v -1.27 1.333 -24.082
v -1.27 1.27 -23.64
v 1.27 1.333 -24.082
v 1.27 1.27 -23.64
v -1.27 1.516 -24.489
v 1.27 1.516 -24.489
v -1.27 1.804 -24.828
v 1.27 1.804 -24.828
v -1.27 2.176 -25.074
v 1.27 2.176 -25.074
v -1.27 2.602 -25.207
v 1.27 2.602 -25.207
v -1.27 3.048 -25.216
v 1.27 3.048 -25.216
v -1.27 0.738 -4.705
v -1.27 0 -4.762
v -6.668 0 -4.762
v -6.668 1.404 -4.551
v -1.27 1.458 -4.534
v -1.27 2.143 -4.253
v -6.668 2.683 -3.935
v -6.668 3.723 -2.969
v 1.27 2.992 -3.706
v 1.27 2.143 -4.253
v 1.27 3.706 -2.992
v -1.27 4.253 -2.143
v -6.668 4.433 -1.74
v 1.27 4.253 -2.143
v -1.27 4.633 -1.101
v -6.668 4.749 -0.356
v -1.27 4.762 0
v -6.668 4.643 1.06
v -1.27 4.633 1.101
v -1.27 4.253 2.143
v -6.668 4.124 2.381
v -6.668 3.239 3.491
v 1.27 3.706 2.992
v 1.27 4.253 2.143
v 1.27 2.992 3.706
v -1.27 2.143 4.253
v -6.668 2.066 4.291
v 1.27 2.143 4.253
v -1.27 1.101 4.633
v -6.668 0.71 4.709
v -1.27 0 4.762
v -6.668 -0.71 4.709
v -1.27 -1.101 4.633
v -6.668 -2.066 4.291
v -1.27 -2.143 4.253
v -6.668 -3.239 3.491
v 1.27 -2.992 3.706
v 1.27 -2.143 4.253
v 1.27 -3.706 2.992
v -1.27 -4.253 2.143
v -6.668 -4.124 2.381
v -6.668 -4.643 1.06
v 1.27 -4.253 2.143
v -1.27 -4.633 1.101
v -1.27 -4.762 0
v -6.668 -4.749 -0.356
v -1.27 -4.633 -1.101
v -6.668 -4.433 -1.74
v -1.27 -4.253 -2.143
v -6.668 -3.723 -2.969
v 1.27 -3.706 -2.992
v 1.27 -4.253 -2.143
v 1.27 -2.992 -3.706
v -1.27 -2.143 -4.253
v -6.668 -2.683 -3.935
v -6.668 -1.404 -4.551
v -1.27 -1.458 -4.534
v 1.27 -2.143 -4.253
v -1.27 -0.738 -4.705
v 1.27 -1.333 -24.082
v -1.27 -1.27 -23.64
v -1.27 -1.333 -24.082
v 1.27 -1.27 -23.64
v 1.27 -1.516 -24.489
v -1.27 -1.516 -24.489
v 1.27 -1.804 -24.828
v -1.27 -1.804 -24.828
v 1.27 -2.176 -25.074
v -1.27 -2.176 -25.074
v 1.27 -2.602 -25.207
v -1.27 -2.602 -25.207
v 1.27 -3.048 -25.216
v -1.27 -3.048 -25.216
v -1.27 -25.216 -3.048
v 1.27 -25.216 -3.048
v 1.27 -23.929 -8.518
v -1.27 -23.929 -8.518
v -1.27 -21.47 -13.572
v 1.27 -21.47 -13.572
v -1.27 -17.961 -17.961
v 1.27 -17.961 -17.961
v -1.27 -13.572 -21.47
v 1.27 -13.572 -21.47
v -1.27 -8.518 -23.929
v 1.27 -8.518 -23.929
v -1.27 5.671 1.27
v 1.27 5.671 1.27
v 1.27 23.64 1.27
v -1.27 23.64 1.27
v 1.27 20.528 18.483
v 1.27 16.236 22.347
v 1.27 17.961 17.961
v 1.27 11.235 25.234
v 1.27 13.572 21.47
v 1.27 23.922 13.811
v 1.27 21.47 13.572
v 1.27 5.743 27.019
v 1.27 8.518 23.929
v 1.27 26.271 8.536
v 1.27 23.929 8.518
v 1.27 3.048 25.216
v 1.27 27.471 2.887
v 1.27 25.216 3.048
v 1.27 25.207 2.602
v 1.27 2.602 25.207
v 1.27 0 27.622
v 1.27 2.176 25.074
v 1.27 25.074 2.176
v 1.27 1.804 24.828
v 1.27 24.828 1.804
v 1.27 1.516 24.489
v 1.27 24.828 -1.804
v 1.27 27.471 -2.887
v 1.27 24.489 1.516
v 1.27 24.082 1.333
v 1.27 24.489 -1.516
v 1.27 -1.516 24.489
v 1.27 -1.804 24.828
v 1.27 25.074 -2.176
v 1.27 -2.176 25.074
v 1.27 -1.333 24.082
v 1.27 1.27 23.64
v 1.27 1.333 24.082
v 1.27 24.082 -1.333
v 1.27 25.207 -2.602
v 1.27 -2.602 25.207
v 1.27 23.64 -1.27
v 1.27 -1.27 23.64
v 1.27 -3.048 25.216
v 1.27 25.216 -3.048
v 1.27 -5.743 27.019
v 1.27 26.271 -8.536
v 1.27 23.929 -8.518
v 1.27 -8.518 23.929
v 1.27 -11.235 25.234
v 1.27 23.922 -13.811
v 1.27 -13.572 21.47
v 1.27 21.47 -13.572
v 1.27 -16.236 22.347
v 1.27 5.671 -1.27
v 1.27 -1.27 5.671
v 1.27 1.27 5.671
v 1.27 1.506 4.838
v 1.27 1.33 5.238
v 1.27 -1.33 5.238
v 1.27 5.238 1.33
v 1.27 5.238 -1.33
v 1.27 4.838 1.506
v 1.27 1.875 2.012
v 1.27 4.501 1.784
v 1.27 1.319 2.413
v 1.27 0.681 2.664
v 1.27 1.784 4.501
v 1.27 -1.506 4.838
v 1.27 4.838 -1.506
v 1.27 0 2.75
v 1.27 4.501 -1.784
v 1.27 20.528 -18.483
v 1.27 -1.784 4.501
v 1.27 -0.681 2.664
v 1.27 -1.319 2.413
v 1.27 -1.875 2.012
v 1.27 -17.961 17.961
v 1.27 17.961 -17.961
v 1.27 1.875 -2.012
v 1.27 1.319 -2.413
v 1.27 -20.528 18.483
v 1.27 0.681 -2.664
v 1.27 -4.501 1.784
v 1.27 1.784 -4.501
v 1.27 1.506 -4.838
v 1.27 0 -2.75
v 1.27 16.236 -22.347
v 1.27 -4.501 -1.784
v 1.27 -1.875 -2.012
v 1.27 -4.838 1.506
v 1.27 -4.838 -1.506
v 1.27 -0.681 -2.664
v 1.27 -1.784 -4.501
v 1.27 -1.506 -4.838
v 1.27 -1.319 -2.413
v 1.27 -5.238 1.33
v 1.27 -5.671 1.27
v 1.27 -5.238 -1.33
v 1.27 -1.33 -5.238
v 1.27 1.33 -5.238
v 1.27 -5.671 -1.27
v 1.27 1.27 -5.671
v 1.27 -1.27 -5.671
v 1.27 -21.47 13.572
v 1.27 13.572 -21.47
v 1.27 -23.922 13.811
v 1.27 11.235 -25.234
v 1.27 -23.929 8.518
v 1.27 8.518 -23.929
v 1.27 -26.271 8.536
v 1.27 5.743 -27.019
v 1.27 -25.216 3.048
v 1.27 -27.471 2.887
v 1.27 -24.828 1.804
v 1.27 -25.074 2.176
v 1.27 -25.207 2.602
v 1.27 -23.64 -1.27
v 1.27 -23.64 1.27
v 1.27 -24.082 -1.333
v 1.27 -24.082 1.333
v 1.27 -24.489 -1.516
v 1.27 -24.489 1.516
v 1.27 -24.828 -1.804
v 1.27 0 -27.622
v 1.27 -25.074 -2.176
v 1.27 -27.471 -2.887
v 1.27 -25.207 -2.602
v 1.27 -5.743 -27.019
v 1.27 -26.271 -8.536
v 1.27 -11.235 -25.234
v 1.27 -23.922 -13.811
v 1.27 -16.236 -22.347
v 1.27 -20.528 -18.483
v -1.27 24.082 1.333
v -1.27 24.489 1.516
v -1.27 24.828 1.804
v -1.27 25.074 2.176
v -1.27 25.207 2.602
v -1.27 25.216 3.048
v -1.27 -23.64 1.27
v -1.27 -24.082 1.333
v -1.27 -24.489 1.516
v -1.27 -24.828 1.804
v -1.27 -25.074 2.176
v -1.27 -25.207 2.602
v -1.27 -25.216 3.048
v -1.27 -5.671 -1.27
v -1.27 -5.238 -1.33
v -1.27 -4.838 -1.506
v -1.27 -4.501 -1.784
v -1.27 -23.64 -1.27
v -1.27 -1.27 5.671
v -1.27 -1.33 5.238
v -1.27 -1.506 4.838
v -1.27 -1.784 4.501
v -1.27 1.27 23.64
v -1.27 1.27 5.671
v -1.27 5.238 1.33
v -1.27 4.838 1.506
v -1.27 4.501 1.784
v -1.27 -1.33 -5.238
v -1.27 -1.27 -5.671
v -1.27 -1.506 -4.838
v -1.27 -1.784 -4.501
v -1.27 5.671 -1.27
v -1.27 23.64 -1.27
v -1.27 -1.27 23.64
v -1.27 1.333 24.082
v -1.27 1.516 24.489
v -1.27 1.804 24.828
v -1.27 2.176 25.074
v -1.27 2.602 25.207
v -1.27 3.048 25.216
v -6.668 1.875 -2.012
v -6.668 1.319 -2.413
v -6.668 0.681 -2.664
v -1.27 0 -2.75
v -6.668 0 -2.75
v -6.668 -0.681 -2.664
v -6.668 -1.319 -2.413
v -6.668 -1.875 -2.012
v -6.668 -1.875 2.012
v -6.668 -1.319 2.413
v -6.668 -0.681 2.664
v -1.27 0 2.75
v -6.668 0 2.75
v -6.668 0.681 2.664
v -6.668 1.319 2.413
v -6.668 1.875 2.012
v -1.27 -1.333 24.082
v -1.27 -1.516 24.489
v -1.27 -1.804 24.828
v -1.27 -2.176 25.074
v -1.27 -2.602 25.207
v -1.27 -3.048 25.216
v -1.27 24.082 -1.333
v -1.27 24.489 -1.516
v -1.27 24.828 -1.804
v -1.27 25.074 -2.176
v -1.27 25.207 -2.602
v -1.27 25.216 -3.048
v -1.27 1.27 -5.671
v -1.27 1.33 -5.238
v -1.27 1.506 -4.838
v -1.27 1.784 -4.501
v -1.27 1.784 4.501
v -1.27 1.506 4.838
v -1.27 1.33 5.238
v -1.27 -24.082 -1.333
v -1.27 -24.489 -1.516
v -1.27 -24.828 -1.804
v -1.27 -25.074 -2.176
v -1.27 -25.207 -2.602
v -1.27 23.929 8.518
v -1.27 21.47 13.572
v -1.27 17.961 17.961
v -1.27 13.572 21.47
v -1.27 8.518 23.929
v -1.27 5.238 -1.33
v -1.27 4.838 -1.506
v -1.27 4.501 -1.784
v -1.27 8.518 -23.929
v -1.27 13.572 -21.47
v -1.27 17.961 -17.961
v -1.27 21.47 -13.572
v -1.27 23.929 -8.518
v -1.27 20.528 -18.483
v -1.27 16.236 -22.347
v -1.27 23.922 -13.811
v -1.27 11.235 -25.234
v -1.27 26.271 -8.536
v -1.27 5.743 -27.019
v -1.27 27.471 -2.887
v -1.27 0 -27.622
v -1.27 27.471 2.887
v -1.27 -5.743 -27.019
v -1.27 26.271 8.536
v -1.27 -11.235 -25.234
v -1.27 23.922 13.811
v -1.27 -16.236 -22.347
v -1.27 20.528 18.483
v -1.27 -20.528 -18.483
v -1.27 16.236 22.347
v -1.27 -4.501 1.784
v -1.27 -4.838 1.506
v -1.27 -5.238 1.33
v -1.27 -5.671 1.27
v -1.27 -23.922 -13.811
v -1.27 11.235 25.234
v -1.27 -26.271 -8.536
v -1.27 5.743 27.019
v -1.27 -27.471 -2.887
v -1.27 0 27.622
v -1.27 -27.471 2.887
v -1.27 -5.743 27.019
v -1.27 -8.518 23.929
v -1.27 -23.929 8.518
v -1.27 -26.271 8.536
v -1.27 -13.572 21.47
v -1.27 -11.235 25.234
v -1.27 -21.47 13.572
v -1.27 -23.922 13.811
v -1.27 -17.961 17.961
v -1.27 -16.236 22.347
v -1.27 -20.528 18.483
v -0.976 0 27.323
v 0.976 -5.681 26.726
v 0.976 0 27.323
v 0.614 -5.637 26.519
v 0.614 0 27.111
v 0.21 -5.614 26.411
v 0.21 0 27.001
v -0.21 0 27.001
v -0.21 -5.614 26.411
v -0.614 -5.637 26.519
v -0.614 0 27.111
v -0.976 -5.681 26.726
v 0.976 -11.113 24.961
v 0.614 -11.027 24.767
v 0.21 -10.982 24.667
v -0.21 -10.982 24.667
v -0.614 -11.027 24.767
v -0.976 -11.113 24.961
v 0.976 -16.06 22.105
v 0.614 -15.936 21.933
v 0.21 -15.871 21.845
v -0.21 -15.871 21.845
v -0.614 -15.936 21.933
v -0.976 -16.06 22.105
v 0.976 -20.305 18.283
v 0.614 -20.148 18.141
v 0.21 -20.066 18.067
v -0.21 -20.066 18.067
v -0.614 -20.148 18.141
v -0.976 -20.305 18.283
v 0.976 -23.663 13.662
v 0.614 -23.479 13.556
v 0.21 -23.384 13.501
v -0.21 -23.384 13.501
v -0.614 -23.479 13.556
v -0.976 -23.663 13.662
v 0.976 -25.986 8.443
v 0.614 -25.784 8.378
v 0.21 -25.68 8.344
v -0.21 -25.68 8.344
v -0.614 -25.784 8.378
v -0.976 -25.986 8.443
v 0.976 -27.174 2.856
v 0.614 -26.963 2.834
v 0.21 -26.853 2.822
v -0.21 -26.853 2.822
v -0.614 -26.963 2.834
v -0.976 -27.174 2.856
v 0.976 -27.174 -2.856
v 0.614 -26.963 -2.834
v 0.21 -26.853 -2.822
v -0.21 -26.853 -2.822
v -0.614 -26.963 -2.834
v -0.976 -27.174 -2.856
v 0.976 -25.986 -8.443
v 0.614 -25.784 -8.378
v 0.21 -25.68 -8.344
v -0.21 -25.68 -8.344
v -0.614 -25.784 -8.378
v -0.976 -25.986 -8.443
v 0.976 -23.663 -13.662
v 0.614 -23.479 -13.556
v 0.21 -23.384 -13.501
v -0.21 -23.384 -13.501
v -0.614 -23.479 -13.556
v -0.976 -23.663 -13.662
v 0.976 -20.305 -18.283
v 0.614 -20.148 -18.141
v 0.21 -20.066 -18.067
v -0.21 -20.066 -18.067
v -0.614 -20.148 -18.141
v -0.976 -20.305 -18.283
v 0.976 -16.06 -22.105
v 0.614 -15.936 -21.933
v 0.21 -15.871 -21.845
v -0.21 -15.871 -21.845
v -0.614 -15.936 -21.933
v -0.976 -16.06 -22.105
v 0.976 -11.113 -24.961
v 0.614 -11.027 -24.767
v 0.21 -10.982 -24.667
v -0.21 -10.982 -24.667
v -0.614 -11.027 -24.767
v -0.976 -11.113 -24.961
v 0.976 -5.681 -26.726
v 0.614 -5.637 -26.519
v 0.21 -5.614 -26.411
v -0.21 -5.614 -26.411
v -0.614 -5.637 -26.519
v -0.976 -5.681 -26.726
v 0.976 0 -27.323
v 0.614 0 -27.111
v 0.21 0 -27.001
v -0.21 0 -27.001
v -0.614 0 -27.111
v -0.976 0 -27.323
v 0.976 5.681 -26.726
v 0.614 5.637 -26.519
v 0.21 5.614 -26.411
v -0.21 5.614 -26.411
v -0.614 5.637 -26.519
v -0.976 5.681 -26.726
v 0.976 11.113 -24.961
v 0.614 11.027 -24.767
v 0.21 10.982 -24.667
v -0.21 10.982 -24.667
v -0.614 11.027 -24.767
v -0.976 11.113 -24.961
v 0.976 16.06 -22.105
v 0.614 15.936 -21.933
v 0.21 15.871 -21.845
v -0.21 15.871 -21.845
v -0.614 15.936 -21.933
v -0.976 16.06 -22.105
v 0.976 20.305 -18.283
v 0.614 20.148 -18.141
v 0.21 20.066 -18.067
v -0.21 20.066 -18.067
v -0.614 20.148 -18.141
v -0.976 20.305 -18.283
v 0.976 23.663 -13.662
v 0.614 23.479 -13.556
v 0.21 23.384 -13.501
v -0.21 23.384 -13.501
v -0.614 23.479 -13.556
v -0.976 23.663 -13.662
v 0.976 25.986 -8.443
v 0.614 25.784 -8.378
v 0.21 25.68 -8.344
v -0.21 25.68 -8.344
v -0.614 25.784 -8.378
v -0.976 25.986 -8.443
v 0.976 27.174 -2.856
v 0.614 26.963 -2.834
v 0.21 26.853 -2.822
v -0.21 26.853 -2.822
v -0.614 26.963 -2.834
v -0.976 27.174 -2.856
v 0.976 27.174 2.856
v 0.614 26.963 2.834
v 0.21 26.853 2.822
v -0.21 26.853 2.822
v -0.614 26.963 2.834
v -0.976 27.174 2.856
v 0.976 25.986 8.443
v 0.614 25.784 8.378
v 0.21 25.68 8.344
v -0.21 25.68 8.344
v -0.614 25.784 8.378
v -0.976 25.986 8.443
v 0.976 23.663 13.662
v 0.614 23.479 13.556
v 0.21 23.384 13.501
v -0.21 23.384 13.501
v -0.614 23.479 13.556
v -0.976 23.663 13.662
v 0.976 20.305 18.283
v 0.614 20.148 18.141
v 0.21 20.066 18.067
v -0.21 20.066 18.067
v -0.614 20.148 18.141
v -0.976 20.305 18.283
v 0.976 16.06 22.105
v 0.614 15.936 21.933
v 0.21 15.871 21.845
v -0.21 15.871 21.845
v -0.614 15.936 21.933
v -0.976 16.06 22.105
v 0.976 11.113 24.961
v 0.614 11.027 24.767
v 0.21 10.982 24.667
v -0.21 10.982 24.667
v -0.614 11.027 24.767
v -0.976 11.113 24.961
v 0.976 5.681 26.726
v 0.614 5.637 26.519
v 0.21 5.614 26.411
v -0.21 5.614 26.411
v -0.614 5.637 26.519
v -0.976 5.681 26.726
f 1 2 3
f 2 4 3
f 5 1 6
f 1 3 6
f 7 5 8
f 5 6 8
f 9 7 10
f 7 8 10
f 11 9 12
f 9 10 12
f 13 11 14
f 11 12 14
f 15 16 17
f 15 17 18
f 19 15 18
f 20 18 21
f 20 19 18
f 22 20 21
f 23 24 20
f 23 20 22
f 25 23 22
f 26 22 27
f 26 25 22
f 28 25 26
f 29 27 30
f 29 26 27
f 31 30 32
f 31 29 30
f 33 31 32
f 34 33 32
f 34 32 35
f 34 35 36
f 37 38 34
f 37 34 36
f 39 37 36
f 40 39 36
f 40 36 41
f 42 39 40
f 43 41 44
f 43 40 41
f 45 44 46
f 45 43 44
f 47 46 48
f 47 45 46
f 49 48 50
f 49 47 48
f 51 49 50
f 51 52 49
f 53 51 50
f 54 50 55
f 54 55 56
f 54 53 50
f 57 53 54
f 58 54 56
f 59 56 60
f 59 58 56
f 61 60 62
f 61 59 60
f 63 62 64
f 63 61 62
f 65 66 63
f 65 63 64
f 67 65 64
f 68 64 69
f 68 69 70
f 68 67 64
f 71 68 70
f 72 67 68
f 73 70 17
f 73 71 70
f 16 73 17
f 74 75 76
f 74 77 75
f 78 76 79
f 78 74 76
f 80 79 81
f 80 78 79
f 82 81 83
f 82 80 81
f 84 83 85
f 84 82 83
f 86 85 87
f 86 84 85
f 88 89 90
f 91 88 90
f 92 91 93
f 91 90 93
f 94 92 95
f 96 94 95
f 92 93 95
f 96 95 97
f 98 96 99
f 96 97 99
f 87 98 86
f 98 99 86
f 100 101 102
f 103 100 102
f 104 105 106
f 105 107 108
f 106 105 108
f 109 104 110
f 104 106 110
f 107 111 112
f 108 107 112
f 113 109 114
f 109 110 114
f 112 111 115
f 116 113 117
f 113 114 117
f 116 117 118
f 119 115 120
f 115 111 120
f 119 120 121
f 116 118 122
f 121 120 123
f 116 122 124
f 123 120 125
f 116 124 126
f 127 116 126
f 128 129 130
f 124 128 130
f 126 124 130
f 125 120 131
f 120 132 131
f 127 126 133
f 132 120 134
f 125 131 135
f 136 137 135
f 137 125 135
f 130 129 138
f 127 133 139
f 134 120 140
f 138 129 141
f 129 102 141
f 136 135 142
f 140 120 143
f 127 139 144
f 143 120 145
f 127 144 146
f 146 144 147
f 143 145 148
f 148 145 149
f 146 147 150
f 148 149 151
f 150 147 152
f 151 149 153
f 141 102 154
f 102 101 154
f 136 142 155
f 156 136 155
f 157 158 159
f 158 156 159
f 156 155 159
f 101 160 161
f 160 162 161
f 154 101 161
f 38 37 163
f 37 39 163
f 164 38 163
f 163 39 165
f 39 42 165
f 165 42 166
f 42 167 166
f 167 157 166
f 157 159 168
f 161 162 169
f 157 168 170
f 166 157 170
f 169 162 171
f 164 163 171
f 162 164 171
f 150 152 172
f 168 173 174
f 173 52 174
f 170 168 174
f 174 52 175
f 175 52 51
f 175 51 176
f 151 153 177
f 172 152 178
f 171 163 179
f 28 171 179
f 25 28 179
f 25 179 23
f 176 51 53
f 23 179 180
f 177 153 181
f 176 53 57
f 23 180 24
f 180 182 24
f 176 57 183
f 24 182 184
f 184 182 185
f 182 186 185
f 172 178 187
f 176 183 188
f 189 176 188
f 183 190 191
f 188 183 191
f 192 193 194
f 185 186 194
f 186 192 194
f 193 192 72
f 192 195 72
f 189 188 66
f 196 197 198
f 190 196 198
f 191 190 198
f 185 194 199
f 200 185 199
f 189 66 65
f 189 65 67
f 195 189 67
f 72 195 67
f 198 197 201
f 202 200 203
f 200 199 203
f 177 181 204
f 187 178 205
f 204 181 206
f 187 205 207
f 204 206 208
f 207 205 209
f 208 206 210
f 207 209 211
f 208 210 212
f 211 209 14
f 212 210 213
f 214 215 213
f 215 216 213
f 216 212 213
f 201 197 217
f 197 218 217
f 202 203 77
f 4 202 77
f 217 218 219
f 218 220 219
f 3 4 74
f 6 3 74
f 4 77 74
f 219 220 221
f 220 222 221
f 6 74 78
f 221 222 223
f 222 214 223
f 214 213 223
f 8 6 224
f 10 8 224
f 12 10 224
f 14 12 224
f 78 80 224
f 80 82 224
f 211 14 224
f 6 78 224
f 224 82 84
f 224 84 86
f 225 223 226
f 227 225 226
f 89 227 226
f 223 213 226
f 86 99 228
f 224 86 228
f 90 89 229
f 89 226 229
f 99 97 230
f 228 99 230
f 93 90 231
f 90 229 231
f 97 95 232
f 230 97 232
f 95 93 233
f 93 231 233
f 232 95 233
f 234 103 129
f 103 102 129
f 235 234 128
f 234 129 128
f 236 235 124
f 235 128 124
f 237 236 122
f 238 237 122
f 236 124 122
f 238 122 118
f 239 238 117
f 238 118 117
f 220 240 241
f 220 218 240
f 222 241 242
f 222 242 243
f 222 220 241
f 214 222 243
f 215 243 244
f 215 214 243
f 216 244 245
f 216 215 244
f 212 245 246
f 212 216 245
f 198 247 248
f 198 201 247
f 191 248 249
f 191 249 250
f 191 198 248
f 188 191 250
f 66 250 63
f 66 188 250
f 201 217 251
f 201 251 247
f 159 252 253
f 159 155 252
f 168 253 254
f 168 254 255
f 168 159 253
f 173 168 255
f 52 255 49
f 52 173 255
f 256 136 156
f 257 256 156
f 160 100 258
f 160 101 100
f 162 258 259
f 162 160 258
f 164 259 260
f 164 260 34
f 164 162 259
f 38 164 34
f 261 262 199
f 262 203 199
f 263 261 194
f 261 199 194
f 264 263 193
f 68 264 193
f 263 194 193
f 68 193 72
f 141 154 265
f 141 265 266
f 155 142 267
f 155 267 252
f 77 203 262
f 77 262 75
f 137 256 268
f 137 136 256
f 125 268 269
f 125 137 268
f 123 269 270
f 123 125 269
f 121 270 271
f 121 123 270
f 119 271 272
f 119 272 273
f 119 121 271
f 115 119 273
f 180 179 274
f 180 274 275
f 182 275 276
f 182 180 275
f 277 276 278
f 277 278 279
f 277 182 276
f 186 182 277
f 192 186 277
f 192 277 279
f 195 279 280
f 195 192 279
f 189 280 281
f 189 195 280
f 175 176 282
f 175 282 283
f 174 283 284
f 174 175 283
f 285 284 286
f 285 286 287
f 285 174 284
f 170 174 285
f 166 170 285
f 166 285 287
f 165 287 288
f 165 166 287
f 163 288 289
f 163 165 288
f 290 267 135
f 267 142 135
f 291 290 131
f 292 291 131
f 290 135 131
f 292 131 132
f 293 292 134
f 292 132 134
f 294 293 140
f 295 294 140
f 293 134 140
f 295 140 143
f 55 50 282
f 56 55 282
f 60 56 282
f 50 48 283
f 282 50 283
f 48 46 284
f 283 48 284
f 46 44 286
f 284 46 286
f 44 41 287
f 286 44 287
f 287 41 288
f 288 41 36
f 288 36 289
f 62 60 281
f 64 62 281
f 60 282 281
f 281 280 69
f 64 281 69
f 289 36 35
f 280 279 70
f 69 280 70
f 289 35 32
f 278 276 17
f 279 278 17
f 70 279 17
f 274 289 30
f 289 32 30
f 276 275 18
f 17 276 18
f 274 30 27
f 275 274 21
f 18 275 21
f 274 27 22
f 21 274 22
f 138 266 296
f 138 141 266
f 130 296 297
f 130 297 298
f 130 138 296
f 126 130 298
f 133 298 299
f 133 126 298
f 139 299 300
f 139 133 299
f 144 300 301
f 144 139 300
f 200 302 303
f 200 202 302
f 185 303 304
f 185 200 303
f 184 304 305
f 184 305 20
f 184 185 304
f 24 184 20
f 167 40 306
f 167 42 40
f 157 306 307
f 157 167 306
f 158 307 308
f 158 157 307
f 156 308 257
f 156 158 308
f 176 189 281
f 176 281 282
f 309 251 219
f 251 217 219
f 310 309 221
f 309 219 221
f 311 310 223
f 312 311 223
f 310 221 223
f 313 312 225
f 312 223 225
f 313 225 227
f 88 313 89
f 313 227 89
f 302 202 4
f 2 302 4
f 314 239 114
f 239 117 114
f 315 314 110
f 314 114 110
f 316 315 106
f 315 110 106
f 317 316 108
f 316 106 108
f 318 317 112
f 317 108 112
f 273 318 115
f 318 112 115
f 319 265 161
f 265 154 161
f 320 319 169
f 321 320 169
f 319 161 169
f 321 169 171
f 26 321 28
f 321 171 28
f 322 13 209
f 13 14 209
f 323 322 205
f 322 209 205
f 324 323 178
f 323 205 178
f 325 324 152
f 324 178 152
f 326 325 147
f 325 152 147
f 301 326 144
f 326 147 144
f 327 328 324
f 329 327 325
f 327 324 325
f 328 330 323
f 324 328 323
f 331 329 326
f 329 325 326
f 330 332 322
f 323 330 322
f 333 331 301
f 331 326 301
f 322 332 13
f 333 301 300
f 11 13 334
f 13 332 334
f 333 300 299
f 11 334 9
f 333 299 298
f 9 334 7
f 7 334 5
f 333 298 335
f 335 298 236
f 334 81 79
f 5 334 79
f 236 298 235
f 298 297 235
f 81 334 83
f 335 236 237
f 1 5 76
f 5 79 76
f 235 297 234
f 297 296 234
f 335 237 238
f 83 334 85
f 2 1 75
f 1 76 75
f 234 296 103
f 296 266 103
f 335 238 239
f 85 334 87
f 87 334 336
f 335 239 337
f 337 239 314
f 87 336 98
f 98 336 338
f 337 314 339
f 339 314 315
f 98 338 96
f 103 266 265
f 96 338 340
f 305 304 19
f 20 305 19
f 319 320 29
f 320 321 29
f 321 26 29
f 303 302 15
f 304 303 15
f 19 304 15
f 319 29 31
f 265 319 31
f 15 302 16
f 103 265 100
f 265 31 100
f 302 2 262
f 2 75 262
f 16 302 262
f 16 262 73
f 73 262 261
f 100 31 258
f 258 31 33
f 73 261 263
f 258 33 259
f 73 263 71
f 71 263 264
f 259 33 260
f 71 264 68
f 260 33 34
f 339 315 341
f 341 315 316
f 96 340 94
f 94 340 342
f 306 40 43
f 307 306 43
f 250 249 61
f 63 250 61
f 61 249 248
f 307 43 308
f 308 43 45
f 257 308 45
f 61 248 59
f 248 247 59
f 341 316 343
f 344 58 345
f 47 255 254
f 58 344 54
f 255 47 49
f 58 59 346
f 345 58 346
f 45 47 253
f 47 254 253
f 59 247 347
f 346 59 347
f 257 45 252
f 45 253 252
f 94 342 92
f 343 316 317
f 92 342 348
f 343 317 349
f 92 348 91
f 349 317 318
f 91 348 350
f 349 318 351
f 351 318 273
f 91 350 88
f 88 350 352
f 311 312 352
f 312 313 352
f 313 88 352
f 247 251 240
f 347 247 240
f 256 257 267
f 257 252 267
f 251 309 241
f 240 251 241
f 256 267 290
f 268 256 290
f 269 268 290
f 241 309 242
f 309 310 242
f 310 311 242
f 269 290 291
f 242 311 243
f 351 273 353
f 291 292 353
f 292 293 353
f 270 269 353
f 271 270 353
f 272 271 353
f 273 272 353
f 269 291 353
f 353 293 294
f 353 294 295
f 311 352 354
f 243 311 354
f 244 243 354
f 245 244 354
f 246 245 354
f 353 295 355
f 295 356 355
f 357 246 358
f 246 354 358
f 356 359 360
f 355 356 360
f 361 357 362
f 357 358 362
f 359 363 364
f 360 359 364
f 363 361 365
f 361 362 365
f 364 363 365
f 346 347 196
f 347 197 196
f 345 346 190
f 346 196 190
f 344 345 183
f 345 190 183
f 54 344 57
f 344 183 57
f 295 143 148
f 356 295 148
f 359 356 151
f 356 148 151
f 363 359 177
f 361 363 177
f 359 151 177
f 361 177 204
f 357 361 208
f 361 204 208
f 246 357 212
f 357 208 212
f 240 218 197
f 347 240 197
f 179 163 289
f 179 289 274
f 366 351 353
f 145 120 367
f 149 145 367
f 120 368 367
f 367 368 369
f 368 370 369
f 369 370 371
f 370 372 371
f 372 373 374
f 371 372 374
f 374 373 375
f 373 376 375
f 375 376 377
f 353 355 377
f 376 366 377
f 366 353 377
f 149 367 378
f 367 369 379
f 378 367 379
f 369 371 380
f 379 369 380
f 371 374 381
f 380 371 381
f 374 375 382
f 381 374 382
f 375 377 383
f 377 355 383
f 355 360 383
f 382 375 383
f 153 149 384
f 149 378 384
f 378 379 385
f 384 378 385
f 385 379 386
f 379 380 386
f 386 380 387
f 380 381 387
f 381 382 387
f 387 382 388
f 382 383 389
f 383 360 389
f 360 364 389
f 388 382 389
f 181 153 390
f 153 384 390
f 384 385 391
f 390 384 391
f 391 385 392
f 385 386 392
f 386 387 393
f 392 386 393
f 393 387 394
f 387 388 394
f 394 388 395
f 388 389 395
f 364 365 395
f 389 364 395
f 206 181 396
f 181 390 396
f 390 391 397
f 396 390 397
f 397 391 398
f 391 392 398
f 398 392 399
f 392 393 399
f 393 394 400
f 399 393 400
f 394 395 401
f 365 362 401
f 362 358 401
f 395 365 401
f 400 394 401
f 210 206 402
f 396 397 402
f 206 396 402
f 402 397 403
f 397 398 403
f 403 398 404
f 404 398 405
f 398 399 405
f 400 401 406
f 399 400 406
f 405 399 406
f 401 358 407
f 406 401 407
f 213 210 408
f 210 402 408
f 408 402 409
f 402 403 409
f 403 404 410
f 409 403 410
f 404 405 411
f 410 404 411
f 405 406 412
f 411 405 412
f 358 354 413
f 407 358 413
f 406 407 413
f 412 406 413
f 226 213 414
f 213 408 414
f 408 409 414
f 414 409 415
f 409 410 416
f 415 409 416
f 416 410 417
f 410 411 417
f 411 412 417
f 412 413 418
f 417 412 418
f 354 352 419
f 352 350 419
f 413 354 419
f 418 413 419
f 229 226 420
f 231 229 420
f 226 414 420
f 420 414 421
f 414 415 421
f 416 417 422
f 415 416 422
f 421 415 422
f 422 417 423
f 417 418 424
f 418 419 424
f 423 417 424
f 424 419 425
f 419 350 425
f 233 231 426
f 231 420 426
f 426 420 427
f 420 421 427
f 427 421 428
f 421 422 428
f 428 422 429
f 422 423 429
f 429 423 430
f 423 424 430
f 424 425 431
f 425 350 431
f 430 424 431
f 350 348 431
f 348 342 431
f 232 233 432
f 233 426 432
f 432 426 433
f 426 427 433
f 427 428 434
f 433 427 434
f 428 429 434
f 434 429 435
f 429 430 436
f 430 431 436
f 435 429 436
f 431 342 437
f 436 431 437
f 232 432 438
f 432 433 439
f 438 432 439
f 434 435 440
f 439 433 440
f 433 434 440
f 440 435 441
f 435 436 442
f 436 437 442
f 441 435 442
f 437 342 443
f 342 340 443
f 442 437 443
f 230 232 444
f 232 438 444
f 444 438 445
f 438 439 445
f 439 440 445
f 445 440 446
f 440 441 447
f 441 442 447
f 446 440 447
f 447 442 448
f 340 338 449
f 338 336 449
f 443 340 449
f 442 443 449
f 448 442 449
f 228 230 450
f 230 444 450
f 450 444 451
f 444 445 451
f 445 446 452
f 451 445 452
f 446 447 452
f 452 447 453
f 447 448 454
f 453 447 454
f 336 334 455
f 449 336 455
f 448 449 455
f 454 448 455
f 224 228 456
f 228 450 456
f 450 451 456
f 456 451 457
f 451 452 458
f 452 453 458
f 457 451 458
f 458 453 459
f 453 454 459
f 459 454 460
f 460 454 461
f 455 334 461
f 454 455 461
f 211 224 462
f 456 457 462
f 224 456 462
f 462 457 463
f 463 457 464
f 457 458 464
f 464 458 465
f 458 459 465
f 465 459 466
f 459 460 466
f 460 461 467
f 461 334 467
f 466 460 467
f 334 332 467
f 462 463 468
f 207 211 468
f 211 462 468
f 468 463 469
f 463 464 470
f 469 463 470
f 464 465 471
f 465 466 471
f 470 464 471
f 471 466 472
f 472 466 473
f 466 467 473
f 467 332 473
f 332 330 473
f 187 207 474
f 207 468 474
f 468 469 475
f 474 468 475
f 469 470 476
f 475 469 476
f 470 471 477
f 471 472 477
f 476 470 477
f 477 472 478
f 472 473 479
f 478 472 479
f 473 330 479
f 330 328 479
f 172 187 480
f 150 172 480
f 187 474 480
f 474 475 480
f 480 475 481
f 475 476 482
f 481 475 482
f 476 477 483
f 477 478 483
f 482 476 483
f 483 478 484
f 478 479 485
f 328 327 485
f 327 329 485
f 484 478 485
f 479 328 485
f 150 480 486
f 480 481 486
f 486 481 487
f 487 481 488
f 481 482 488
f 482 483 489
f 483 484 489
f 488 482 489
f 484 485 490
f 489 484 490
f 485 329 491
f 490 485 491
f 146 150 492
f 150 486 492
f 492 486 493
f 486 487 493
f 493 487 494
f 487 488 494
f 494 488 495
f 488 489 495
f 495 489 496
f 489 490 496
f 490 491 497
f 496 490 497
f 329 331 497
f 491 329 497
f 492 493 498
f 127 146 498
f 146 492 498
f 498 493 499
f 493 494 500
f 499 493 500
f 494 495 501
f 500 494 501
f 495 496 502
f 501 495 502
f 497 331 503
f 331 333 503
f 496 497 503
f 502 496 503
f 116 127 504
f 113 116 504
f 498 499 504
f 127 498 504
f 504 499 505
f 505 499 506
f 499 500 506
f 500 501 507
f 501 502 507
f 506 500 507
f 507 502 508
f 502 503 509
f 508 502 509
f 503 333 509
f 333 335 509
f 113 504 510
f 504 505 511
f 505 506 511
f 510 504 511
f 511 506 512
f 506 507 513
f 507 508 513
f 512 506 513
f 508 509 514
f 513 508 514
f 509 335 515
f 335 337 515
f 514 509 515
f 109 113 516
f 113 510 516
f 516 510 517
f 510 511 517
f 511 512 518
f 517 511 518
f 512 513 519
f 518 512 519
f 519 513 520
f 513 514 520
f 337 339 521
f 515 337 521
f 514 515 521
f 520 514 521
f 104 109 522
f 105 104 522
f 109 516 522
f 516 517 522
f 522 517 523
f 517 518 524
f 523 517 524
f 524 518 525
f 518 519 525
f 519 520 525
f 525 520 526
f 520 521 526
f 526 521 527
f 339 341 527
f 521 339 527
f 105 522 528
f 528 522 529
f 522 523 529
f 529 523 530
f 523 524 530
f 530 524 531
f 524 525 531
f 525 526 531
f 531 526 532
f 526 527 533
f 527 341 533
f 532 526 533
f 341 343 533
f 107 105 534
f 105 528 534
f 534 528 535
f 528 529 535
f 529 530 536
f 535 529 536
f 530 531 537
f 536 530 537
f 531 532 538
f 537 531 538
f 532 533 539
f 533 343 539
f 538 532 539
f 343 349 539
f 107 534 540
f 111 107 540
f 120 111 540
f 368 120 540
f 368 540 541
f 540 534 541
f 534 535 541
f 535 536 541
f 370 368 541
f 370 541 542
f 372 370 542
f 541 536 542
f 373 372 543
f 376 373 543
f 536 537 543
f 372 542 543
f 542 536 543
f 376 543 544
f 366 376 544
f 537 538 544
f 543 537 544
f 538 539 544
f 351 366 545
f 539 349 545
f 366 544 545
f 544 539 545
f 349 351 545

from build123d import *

# Parameters (mm, degrees)
SKETCH2_R           = 4.7625
BOSS_EXTRUDE1_DEPTH = 7.9375
SKETCH3_W           = 22.65
SKETCH3_H           = 2.54
SKETCH3_W_2         = 2.54
SKETCH3_H_2         = 23.525
EXTRUDE_THIN1_DEPTH = 2.54
FILLET1_R           = 1.5875


with BuildPart() as part:
    # Sketch1 → Revolve1 (revolve)
    with BuildSketch(Plane.XY, mode=Mode.PRIVATE) as revolve1_sk:
        with BuildLine():
            Line((-1.27, 25.4), (1.27, 25.4))
            Line((1.27, 25.4), (1.27, 27.6225))
            ThreePointArc((1.27, 27.6225), (0, 26.9875), (-1.27, 27.6225))
            Line((-1.27, 27.6225), (-1.27, 25.4))
        make_face()
    revolve(revolve1_sk.sketch.rotate(Axis((-2.168850248, 0, 0), (1, 0, 0)), 90), axis=Axis((-2.168850248, 0, 0), (1, 0, 0)))



with BuildPart() as body_2:
    # Sketch2 → Boss-Extrude1 (new body)
    with BuildSketch(Plane(origin=(1.27, 0, 0), x_dir=(0, 0, -1), z_dir=(1, 0, 0))):
        Circle(SKETCH2_R)
        with BuildLine():
            Line((-2.011684617, 1.875), (2.011684617, 1.875))
            ThreePointArc((2.011684617, 1.875), (2.75, 0), (2.011684617, -1.875))
            Line((2.011684617, -1.875), (-2.011684617, -1.875))
            ThreePointArc((-2.011684617, -1.875), (-2.75, 0), (-2.011684617, 1.875))
        make_face(mode=Mode.SUBTRACT)
    extrude(amount=-BOSS_EXTRUDE1_DEPTH)


with BuildPart() as part_1:
    add(part.part)

    add(body_2.part)  # Extrude-Thin1 merges body 2
    # Sketch3 → Extrude-Thin1 (add)
    with BuildSketch(Plane(origin=(1.27, 0, 0), x_dir=(0, 0, -1), z_dir=(1, 0, 0))):
        with Locations((-14.075, 0)):
            Rectangle(SKETCH3_W, SKETCH3_H)
        with Locations((0, 13.6375)):
            Rectangle(SKETCH3_W_2, SKETCH3_H_2)
        with Locations((14.075, 0)):
            Rectangle(SKETCH3_W, SKETCH3_H)
        with Locations((0, -13.6375)):
            Rectangle(SKETCH3_W_2, SKETCH3_H_2)
    extrude(amount=-EXTRUDE_THIN1_DEPTH)

    # Fillet1
    fillet1_edges = [part_1.edges().sort_by_distance(p)[0] for p in [
        (0, -1.27, -4.590044254),
        (0, -1.27, -25.368230131),
        (0, 1.27, 25.368230131),
        (0, -1.27, 25.368230131),
        (0, -4.590044254, -1.27),
        (0, -25.368230131, -1.27),
        (0, -4.590044254, 1.27),
        (0, -25.368230131, 1.27),
        (0, 1.27, 4.590044254),
        (0, -1.27, 4.590044254),
        (0, 25.368230131, 1.27),
        (0, 4.590044254, 1.27),
        (0, 4.590044254, -1.27),
        (0, 25.368230131, -1.27),
        (0, 1.27, -4.590044254),
        (0, 1.27, -25.368230131),
    ]]
    fillet(fillet1_edges, radius=FILLET1_R)


solid = part_1.part
